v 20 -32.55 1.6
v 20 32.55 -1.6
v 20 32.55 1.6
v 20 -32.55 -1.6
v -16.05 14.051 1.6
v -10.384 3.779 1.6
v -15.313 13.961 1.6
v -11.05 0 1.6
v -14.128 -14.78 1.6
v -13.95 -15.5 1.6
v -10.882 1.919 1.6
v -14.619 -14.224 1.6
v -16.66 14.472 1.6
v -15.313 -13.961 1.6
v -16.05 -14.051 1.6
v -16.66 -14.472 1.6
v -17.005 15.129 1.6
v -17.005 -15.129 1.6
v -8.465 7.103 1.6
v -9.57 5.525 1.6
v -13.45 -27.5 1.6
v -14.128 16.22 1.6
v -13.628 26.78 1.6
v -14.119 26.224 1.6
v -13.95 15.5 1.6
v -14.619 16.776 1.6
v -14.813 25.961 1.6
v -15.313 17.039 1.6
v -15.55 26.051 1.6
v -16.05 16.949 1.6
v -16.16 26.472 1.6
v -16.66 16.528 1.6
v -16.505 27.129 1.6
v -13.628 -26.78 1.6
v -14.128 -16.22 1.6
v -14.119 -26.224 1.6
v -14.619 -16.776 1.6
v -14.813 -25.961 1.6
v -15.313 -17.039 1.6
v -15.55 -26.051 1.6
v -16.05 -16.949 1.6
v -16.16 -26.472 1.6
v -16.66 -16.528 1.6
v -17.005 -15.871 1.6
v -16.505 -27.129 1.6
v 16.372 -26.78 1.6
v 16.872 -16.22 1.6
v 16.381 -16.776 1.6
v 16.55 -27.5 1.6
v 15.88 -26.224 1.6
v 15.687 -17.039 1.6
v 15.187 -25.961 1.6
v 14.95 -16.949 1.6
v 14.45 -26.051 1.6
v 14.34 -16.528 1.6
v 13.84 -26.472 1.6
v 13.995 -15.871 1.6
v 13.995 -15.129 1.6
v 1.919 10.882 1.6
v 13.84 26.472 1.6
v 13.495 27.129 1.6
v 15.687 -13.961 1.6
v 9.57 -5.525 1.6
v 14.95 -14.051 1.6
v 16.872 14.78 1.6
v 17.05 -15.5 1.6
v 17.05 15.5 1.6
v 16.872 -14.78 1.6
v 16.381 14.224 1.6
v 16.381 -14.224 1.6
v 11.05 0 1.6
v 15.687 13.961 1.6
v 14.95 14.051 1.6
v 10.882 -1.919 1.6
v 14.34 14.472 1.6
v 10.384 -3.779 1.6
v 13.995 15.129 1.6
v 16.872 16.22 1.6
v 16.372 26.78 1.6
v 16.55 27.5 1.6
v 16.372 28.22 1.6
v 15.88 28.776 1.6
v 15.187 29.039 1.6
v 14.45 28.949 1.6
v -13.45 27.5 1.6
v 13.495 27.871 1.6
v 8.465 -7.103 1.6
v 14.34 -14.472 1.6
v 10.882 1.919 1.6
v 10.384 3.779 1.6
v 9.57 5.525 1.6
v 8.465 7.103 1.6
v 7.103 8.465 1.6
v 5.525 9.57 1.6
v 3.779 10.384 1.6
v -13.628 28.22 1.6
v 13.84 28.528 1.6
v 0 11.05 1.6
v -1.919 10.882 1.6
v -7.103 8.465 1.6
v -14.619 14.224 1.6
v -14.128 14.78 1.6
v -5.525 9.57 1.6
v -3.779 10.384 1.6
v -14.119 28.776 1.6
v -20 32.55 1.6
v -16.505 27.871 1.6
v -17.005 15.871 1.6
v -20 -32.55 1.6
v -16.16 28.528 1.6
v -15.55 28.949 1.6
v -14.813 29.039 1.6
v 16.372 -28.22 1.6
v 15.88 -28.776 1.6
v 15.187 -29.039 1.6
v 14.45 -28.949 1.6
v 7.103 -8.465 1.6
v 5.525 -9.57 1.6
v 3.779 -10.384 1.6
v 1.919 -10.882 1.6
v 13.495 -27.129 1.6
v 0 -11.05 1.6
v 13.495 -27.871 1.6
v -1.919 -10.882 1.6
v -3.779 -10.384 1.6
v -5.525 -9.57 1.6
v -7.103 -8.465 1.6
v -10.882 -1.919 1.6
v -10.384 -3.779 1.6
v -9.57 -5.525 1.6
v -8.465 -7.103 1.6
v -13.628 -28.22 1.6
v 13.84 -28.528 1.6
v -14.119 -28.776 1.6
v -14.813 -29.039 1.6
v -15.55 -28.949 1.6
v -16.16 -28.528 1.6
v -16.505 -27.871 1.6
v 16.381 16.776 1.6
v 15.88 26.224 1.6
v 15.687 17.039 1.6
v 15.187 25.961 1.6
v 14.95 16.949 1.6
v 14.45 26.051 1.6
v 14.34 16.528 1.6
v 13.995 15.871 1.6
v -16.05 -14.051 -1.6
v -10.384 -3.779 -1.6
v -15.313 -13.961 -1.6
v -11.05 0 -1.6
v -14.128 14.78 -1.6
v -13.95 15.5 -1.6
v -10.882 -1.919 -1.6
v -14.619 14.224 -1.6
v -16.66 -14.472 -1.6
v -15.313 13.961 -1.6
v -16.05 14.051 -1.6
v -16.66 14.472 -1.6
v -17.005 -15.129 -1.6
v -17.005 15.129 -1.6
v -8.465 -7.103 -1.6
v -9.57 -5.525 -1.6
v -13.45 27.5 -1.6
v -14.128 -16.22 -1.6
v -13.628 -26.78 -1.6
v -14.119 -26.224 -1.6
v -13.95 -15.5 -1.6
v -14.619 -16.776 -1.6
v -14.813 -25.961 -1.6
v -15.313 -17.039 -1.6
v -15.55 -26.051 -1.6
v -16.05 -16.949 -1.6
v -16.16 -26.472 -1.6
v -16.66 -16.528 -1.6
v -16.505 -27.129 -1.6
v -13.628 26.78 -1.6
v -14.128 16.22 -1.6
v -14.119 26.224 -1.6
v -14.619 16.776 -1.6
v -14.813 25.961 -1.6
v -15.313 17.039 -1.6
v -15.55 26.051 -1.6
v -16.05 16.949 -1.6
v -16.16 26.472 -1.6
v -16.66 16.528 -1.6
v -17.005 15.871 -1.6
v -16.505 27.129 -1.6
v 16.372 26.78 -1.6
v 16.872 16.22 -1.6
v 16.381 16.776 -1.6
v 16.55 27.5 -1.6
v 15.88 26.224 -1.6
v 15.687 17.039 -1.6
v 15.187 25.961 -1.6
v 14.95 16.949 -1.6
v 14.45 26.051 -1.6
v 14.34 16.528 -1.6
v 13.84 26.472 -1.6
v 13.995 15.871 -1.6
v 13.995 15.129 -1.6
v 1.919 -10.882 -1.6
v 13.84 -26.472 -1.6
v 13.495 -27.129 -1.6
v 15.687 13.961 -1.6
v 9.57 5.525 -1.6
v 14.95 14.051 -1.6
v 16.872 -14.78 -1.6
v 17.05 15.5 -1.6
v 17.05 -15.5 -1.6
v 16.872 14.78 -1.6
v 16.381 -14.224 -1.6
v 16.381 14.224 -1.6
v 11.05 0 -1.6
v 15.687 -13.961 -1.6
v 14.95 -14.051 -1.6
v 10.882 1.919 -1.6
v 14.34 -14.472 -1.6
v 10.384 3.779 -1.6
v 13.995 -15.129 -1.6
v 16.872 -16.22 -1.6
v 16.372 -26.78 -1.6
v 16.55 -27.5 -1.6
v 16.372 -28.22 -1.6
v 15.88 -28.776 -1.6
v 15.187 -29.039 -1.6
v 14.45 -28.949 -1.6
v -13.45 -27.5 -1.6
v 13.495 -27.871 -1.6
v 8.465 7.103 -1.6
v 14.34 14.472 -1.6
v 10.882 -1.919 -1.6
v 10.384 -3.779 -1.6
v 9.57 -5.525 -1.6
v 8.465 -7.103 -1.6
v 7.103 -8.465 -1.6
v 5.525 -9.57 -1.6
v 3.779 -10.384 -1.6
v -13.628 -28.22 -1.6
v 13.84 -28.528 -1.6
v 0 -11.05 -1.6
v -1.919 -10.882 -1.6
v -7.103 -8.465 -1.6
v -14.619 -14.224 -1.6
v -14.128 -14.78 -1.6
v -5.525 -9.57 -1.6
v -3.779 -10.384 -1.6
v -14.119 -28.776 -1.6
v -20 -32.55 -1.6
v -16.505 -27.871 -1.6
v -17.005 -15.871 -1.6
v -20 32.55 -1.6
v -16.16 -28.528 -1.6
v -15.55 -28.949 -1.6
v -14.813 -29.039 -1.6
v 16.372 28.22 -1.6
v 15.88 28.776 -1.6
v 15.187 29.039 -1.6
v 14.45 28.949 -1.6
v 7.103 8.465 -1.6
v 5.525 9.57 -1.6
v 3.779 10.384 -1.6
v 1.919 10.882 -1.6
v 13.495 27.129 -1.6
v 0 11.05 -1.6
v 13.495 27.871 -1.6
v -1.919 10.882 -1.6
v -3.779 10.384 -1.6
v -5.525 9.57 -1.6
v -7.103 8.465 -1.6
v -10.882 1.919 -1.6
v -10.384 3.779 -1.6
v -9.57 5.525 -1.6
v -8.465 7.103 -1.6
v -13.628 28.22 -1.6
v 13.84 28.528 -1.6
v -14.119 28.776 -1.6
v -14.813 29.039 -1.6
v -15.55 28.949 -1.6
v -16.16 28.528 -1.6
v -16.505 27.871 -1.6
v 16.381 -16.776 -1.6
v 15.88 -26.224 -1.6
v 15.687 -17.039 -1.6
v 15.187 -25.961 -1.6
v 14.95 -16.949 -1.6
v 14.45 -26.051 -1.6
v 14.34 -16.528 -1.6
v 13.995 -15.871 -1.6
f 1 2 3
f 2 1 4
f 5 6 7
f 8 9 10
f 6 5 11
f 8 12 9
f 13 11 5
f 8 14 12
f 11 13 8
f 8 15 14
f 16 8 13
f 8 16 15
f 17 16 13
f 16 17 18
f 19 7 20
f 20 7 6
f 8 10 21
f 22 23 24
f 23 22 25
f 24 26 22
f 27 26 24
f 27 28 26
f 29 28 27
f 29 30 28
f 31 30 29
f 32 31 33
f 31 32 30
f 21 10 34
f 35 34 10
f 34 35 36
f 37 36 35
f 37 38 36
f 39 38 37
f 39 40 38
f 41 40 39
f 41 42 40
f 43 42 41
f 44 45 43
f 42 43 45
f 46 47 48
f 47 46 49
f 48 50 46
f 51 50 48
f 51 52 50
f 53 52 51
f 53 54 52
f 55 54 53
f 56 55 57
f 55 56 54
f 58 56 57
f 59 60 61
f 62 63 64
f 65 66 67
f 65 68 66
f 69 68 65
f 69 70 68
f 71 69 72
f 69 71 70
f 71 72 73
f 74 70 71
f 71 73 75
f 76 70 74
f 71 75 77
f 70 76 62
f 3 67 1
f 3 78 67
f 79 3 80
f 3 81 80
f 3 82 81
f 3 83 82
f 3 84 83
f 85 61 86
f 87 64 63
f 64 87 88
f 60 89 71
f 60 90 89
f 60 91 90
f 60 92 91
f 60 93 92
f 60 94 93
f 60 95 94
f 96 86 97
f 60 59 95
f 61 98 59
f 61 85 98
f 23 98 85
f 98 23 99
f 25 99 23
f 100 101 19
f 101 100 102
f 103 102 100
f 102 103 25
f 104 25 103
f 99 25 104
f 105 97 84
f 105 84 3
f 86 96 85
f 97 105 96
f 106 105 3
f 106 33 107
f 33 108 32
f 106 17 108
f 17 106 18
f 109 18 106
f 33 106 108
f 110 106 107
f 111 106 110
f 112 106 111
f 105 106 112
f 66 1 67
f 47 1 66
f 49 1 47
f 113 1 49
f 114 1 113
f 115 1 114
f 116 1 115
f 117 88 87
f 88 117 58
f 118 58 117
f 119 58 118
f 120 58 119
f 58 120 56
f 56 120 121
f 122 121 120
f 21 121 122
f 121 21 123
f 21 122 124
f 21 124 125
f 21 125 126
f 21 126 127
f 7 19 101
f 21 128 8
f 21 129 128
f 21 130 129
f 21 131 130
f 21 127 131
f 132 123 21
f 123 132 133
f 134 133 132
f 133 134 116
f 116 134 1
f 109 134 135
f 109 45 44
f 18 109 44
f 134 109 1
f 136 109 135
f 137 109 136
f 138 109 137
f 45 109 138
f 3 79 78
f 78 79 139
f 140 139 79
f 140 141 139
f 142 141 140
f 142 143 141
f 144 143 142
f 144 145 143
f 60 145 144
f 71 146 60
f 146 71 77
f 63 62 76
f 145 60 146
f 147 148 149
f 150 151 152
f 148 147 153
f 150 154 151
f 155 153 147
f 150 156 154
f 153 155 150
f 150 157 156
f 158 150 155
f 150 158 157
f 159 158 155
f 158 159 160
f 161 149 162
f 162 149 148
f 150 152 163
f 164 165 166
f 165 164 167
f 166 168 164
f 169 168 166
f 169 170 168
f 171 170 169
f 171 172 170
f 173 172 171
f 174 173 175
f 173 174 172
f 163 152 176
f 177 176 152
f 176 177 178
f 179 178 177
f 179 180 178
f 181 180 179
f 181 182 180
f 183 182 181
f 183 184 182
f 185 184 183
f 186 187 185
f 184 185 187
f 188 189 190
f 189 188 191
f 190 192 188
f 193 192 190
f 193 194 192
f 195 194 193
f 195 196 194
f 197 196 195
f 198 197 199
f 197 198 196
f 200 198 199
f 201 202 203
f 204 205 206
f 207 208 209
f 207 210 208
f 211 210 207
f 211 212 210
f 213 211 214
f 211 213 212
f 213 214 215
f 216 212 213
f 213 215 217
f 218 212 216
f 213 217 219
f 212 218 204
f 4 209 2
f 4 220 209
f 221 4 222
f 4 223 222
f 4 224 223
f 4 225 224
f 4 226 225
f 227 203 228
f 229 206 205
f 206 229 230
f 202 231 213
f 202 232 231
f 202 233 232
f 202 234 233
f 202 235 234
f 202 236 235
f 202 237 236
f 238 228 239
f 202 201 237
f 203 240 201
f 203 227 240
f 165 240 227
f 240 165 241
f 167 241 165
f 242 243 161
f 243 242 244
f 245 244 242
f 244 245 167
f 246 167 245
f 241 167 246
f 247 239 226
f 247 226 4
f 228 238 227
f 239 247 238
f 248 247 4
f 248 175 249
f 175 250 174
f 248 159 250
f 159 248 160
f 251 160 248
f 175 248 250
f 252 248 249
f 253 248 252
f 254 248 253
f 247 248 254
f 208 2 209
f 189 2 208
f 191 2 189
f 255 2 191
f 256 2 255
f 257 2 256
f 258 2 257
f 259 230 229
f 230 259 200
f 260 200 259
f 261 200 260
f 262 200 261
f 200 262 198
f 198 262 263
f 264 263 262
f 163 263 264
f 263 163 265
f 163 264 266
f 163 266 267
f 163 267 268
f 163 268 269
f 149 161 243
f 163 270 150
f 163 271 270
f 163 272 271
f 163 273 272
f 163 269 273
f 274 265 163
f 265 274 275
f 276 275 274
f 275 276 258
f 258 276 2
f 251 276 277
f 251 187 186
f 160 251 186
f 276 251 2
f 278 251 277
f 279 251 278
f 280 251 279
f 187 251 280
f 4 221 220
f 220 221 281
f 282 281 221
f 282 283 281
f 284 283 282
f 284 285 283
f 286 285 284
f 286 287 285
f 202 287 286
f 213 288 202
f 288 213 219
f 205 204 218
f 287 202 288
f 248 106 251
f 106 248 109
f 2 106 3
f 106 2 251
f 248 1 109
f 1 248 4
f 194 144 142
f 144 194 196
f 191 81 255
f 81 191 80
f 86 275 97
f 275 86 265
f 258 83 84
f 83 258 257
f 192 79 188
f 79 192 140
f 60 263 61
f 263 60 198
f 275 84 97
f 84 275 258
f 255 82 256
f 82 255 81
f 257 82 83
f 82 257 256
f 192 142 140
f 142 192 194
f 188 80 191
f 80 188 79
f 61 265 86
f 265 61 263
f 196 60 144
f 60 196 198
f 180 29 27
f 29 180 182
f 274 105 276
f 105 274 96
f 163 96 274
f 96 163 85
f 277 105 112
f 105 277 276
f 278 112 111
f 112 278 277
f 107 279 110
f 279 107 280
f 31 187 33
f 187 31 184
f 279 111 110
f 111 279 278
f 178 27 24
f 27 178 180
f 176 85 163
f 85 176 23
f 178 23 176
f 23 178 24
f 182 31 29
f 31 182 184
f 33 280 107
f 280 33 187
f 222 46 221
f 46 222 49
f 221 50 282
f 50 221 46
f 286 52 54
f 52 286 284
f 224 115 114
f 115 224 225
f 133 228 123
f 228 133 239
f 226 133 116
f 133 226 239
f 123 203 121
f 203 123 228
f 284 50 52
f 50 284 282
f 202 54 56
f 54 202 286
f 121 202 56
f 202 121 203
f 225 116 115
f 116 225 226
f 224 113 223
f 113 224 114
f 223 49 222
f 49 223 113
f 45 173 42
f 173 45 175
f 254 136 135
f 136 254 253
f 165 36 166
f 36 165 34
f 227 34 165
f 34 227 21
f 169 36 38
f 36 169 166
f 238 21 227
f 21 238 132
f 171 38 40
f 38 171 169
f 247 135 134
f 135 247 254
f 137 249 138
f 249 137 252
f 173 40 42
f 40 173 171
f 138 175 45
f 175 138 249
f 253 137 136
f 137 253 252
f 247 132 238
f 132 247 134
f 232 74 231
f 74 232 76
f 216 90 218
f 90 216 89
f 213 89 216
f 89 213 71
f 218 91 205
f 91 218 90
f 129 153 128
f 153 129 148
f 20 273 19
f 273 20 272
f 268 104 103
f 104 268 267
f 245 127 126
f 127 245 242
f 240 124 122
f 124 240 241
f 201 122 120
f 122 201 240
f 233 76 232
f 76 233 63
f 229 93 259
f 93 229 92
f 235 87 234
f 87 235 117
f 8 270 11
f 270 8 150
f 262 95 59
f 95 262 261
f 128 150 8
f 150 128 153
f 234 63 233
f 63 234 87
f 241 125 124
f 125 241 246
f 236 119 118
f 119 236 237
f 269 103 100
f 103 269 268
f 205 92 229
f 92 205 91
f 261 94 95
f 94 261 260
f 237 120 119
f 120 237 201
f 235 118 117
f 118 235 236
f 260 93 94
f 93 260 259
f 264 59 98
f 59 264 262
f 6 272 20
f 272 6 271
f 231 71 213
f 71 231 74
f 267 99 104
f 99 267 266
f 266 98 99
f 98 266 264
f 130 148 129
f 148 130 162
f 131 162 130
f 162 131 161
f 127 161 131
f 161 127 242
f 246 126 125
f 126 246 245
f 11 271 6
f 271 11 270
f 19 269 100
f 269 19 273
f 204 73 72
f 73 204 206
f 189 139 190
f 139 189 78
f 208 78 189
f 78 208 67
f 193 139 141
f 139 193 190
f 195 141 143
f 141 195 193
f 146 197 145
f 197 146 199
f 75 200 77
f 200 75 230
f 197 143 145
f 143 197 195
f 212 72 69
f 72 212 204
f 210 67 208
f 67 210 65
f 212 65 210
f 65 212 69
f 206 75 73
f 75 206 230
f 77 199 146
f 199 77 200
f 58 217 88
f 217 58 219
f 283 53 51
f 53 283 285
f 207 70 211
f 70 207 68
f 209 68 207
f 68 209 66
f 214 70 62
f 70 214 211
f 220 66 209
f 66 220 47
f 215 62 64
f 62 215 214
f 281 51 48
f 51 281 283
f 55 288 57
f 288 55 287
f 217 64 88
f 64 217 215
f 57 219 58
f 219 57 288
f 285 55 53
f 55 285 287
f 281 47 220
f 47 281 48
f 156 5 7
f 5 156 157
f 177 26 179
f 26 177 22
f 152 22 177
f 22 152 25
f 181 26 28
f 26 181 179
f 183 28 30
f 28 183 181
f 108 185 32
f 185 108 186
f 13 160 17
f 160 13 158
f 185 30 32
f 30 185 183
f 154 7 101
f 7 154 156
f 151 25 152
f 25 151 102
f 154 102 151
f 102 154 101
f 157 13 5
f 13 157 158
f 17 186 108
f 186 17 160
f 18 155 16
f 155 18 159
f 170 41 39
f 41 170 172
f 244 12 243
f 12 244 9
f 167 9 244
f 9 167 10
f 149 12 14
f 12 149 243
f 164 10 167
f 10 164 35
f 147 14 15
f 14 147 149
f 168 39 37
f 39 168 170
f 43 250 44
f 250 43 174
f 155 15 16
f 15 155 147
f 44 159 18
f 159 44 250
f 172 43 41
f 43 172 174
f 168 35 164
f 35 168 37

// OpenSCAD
// file: utils.scad
include <globals.scad>;
module mount_plate()
{
          side_s = makerbeam_w/2;
          difference()
          {
          cube([stepper_width,base_height+0.1,thickness],center=true);    
          translate([stepper_width/2-side_s,base_height/2-makerbeam_w/2,0])
            cylinder(r=bolt_r,h=thickness*2,center=true);
          translate([-stepper_width/2+side_s,base_height/2-makerbeam_w/2,0])
            cylinder(r=bolt_r,h=thickness*2,center=true);
          translate([stepper_width/2-side_s,-base_height/2+makerbeam_w/2,0])
            cylinder(r=bolt_r,h=thickness*2,center=true);
          translate([-stepper_width/2+side_s,-base_height/2+makerbeam_w/2,0])
            cylinder(r=bolt_r,h=thickness*2,center=true);
        }            
}
// file: globals.scad
//global vars
$fa=10;
$fs=0.8;
thickness=3.2; //material thickness

m3_nut_flats = 5.9;	// normal M3 hex nut exact width = 5.5
m3_nut_depth = 3.0;	// normal M3 hex nut exact depth = 2.4, nyloc = 4
bolt_r=1.55;

stepper_shaft_radius=5/2;
stepper_bush_radius=22.1/2;
stepper_bush_length=4;
bolt_distance=31.0/2;

stepper_width=40;
stepper_height=40;
stepper_length=40;
stepper_shaft_length=21;

makerbeam_w=10;

base_height=65;
// main file
include <globals.scad>;
include <utils.scad>;
stepper_mount();

module stepper_mount()
{
          difference()
          {
          mount_plate();  
          //bush
          cylinder(r=stepper_bush_radius,h=thickness*2,center=true);
            //mounting holes
        translate([bolt_distance,bolt_distance,0])
          cylinder(r=bolt_r,h=thickness*2,center=true);
        translate([bolt_distance,-bolt_distance,0])
          cylinder(r=bolt_r,h=thickness*2,center=true);
        translate([-bolt_distance,bolt_distance,0])
          cylinder(r=bolt_r,h=thickness*2,center=true);
        translate([-bolt_distance,-bolt_distance,0])
          cylinder(r=bolt_r,h=thickness*2,center=true);
          }
}
